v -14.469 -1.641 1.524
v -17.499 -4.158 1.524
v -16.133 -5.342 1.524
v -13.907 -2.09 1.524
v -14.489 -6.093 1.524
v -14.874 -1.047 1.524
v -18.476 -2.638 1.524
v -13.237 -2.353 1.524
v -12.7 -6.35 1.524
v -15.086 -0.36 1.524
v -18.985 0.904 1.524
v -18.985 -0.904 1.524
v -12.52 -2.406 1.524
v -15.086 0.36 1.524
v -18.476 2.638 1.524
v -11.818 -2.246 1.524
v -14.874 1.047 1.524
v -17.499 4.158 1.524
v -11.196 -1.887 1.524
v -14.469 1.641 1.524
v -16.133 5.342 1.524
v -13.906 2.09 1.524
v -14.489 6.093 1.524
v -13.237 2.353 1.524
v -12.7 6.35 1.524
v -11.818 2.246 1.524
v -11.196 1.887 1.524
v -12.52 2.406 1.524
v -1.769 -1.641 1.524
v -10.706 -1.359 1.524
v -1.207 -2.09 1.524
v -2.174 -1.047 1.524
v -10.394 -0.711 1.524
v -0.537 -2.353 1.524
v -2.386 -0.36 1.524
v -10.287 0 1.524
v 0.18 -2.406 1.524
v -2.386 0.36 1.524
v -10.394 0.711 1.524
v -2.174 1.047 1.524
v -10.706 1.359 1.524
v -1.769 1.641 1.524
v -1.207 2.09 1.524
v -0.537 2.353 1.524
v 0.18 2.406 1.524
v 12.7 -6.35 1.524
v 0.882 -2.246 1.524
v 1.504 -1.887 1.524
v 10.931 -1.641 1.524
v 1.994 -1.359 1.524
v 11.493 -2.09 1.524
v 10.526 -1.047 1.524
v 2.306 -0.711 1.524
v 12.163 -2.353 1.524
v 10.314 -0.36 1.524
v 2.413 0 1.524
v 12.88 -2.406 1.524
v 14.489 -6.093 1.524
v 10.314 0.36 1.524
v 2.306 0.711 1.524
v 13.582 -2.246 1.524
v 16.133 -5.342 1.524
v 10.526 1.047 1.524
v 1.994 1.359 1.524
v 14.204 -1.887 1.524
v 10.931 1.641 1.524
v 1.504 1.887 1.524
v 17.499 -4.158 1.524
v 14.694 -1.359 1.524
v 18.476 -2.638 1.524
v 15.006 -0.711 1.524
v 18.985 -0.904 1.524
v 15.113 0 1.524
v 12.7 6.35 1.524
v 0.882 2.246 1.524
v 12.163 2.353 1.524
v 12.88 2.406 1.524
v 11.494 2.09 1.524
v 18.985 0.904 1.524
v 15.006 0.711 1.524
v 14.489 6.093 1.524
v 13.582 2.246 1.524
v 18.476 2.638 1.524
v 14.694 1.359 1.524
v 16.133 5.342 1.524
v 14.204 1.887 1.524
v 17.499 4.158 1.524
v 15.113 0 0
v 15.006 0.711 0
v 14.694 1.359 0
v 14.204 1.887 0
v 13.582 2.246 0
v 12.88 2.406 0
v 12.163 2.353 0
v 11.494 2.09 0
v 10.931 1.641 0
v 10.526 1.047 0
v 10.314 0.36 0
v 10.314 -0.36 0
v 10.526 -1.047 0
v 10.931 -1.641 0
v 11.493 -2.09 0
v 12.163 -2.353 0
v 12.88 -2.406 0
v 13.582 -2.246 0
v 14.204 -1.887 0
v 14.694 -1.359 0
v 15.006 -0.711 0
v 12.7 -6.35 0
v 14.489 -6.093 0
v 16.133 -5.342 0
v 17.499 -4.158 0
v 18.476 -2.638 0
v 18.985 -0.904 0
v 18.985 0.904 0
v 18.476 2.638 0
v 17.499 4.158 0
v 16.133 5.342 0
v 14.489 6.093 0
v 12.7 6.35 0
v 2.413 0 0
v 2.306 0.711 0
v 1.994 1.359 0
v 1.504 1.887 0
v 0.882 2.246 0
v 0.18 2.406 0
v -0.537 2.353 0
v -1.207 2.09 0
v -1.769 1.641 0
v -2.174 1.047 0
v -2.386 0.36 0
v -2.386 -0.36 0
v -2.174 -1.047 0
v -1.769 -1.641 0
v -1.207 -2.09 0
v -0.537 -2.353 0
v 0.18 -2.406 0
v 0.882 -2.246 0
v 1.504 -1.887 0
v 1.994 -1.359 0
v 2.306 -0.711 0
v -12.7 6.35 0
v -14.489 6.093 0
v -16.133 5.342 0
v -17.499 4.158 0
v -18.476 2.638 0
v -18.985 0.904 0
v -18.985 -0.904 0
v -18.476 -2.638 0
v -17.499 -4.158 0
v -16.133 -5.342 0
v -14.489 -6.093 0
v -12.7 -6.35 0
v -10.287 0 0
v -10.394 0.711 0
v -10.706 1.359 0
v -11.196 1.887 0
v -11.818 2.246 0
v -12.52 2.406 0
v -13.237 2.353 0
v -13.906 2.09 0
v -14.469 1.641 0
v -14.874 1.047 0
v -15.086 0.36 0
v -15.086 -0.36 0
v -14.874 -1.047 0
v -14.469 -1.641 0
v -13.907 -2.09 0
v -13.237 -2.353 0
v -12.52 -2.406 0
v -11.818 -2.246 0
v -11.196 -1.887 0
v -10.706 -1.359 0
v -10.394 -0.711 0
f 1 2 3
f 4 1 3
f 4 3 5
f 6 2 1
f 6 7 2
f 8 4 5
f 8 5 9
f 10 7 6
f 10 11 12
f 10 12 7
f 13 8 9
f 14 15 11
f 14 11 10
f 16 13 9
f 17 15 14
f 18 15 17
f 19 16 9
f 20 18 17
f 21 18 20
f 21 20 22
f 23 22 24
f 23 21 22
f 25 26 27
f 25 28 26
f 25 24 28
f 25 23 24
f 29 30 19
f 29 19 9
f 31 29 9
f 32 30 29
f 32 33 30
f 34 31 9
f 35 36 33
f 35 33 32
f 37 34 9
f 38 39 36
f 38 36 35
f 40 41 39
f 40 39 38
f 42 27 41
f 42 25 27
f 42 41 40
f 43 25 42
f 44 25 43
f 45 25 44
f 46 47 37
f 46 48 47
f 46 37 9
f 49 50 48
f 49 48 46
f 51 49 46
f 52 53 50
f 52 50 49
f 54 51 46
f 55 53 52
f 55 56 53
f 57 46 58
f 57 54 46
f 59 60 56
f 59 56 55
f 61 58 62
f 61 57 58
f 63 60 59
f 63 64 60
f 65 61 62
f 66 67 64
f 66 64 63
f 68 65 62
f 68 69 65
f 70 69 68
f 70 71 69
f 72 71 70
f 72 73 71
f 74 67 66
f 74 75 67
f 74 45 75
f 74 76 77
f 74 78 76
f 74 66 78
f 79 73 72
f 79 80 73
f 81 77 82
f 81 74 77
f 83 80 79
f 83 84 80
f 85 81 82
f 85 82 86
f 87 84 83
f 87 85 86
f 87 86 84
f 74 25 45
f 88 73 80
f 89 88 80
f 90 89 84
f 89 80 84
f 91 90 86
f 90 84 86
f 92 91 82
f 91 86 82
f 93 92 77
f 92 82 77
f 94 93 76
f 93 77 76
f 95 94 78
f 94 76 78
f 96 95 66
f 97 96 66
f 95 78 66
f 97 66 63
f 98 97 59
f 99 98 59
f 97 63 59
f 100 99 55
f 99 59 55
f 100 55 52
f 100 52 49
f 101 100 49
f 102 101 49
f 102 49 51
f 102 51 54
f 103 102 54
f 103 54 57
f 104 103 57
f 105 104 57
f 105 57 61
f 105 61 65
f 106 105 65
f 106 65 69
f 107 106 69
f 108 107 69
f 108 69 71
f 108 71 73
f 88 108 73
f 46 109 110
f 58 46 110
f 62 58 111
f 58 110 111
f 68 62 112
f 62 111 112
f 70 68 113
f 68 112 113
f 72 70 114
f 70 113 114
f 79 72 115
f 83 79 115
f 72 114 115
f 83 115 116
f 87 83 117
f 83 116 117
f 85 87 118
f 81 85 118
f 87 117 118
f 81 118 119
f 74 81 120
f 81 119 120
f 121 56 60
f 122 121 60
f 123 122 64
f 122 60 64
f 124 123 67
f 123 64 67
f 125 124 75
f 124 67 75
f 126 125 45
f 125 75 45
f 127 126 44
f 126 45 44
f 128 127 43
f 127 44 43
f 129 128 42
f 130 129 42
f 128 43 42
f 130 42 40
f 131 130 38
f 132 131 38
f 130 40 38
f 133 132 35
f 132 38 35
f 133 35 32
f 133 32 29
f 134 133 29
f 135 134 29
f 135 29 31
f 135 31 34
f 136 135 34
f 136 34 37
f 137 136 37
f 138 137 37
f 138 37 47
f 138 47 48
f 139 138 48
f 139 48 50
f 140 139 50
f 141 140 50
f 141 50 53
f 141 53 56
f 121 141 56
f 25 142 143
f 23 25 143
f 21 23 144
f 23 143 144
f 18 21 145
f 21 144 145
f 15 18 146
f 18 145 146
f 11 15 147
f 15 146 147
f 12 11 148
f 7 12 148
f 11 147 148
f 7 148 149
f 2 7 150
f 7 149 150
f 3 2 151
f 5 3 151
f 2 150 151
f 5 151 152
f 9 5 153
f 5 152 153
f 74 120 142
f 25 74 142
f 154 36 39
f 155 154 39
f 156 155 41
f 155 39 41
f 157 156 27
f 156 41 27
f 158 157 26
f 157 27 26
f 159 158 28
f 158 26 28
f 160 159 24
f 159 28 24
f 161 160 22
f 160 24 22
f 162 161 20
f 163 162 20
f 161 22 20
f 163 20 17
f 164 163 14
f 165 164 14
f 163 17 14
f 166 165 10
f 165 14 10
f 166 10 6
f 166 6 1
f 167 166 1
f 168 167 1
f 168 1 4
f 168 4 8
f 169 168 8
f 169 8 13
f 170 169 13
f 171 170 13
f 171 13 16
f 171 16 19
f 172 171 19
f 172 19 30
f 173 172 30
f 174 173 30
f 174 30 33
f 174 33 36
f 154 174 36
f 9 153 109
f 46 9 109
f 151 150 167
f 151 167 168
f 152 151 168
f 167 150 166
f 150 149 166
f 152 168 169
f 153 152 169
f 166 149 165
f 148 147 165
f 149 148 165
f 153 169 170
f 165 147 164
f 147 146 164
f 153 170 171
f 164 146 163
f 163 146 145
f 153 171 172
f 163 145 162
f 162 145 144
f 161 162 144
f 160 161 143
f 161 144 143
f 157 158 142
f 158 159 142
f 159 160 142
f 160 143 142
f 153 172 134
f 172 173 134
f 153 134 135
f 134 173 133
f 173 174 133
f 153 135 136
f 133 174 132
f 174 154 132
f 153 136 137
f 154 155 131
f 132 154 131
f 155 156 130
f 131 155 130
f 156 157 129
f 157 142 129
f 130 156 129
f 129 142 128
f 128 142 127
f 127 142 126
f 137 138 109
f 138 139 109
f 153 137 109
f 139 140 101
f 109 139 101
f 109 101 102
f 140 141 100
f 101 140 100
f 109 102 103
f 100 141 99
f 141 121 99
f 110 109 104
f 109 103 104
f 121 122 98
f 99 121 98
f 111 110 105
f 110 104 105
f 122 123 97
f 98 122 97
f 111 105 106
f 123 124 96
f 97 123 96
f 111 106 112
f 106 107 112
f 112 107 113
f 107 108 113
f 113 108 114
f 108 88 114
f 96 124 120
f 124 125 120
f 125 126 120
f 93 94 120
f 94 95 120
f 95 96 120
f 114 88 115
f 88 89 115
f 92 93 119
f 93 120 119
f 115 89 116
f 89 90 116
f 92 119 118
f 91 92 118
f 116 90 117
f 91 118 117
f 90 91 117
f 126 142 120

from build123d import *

# Parameters (mm, degrees)
EXTRUDE1_DEPTH  = 1.524
SKETCH2_R       = 2.413
EXTRUDE2_DEPTH  = 2.524
LPATTERN1_COUNT = 3
LPATTERN1_PITCH = 12.7


with BuildPart() as part:
    # Sketch1 → Extrude1 (new body)
    with BuildSketch(Plane.XY):
        with BuildLine():
            Line((-12.7, -6.35), (12.7, -6.35))
            ThreePointArc((12.7, -6.35), (19.05, 0), (12.7, 6.35))
            Line((12.7, 6.35), (-12.7, 6.35))
            ThreePointArc((-12.7, 6.35), (-19.05, 0), (-12.7, -6.35))
        make_face()
    extrude(amount=EXTRUDE1_DEPTH)

    # Sketch2 → Extrude2 (cut, through all)
    with BuildSketch(Plane.XY.offset(1.524)):
        with Locations((-12.7, 0)):
            Circle(SKETCH2_R)
    extrude2 = extrude(amount=-EXTRUDE2_DEPTH, mode=Mode.SUBTRACT)

    # LPattern1: Extrude2 ×3
    with Locations(*[(i * LPATTERN1_PITCH, 0, 0) for i in range(1, LPATTERN1_COUNT)]):
        add(extrude2, mode=Mode.SUBTRACT)


solid = part.part
